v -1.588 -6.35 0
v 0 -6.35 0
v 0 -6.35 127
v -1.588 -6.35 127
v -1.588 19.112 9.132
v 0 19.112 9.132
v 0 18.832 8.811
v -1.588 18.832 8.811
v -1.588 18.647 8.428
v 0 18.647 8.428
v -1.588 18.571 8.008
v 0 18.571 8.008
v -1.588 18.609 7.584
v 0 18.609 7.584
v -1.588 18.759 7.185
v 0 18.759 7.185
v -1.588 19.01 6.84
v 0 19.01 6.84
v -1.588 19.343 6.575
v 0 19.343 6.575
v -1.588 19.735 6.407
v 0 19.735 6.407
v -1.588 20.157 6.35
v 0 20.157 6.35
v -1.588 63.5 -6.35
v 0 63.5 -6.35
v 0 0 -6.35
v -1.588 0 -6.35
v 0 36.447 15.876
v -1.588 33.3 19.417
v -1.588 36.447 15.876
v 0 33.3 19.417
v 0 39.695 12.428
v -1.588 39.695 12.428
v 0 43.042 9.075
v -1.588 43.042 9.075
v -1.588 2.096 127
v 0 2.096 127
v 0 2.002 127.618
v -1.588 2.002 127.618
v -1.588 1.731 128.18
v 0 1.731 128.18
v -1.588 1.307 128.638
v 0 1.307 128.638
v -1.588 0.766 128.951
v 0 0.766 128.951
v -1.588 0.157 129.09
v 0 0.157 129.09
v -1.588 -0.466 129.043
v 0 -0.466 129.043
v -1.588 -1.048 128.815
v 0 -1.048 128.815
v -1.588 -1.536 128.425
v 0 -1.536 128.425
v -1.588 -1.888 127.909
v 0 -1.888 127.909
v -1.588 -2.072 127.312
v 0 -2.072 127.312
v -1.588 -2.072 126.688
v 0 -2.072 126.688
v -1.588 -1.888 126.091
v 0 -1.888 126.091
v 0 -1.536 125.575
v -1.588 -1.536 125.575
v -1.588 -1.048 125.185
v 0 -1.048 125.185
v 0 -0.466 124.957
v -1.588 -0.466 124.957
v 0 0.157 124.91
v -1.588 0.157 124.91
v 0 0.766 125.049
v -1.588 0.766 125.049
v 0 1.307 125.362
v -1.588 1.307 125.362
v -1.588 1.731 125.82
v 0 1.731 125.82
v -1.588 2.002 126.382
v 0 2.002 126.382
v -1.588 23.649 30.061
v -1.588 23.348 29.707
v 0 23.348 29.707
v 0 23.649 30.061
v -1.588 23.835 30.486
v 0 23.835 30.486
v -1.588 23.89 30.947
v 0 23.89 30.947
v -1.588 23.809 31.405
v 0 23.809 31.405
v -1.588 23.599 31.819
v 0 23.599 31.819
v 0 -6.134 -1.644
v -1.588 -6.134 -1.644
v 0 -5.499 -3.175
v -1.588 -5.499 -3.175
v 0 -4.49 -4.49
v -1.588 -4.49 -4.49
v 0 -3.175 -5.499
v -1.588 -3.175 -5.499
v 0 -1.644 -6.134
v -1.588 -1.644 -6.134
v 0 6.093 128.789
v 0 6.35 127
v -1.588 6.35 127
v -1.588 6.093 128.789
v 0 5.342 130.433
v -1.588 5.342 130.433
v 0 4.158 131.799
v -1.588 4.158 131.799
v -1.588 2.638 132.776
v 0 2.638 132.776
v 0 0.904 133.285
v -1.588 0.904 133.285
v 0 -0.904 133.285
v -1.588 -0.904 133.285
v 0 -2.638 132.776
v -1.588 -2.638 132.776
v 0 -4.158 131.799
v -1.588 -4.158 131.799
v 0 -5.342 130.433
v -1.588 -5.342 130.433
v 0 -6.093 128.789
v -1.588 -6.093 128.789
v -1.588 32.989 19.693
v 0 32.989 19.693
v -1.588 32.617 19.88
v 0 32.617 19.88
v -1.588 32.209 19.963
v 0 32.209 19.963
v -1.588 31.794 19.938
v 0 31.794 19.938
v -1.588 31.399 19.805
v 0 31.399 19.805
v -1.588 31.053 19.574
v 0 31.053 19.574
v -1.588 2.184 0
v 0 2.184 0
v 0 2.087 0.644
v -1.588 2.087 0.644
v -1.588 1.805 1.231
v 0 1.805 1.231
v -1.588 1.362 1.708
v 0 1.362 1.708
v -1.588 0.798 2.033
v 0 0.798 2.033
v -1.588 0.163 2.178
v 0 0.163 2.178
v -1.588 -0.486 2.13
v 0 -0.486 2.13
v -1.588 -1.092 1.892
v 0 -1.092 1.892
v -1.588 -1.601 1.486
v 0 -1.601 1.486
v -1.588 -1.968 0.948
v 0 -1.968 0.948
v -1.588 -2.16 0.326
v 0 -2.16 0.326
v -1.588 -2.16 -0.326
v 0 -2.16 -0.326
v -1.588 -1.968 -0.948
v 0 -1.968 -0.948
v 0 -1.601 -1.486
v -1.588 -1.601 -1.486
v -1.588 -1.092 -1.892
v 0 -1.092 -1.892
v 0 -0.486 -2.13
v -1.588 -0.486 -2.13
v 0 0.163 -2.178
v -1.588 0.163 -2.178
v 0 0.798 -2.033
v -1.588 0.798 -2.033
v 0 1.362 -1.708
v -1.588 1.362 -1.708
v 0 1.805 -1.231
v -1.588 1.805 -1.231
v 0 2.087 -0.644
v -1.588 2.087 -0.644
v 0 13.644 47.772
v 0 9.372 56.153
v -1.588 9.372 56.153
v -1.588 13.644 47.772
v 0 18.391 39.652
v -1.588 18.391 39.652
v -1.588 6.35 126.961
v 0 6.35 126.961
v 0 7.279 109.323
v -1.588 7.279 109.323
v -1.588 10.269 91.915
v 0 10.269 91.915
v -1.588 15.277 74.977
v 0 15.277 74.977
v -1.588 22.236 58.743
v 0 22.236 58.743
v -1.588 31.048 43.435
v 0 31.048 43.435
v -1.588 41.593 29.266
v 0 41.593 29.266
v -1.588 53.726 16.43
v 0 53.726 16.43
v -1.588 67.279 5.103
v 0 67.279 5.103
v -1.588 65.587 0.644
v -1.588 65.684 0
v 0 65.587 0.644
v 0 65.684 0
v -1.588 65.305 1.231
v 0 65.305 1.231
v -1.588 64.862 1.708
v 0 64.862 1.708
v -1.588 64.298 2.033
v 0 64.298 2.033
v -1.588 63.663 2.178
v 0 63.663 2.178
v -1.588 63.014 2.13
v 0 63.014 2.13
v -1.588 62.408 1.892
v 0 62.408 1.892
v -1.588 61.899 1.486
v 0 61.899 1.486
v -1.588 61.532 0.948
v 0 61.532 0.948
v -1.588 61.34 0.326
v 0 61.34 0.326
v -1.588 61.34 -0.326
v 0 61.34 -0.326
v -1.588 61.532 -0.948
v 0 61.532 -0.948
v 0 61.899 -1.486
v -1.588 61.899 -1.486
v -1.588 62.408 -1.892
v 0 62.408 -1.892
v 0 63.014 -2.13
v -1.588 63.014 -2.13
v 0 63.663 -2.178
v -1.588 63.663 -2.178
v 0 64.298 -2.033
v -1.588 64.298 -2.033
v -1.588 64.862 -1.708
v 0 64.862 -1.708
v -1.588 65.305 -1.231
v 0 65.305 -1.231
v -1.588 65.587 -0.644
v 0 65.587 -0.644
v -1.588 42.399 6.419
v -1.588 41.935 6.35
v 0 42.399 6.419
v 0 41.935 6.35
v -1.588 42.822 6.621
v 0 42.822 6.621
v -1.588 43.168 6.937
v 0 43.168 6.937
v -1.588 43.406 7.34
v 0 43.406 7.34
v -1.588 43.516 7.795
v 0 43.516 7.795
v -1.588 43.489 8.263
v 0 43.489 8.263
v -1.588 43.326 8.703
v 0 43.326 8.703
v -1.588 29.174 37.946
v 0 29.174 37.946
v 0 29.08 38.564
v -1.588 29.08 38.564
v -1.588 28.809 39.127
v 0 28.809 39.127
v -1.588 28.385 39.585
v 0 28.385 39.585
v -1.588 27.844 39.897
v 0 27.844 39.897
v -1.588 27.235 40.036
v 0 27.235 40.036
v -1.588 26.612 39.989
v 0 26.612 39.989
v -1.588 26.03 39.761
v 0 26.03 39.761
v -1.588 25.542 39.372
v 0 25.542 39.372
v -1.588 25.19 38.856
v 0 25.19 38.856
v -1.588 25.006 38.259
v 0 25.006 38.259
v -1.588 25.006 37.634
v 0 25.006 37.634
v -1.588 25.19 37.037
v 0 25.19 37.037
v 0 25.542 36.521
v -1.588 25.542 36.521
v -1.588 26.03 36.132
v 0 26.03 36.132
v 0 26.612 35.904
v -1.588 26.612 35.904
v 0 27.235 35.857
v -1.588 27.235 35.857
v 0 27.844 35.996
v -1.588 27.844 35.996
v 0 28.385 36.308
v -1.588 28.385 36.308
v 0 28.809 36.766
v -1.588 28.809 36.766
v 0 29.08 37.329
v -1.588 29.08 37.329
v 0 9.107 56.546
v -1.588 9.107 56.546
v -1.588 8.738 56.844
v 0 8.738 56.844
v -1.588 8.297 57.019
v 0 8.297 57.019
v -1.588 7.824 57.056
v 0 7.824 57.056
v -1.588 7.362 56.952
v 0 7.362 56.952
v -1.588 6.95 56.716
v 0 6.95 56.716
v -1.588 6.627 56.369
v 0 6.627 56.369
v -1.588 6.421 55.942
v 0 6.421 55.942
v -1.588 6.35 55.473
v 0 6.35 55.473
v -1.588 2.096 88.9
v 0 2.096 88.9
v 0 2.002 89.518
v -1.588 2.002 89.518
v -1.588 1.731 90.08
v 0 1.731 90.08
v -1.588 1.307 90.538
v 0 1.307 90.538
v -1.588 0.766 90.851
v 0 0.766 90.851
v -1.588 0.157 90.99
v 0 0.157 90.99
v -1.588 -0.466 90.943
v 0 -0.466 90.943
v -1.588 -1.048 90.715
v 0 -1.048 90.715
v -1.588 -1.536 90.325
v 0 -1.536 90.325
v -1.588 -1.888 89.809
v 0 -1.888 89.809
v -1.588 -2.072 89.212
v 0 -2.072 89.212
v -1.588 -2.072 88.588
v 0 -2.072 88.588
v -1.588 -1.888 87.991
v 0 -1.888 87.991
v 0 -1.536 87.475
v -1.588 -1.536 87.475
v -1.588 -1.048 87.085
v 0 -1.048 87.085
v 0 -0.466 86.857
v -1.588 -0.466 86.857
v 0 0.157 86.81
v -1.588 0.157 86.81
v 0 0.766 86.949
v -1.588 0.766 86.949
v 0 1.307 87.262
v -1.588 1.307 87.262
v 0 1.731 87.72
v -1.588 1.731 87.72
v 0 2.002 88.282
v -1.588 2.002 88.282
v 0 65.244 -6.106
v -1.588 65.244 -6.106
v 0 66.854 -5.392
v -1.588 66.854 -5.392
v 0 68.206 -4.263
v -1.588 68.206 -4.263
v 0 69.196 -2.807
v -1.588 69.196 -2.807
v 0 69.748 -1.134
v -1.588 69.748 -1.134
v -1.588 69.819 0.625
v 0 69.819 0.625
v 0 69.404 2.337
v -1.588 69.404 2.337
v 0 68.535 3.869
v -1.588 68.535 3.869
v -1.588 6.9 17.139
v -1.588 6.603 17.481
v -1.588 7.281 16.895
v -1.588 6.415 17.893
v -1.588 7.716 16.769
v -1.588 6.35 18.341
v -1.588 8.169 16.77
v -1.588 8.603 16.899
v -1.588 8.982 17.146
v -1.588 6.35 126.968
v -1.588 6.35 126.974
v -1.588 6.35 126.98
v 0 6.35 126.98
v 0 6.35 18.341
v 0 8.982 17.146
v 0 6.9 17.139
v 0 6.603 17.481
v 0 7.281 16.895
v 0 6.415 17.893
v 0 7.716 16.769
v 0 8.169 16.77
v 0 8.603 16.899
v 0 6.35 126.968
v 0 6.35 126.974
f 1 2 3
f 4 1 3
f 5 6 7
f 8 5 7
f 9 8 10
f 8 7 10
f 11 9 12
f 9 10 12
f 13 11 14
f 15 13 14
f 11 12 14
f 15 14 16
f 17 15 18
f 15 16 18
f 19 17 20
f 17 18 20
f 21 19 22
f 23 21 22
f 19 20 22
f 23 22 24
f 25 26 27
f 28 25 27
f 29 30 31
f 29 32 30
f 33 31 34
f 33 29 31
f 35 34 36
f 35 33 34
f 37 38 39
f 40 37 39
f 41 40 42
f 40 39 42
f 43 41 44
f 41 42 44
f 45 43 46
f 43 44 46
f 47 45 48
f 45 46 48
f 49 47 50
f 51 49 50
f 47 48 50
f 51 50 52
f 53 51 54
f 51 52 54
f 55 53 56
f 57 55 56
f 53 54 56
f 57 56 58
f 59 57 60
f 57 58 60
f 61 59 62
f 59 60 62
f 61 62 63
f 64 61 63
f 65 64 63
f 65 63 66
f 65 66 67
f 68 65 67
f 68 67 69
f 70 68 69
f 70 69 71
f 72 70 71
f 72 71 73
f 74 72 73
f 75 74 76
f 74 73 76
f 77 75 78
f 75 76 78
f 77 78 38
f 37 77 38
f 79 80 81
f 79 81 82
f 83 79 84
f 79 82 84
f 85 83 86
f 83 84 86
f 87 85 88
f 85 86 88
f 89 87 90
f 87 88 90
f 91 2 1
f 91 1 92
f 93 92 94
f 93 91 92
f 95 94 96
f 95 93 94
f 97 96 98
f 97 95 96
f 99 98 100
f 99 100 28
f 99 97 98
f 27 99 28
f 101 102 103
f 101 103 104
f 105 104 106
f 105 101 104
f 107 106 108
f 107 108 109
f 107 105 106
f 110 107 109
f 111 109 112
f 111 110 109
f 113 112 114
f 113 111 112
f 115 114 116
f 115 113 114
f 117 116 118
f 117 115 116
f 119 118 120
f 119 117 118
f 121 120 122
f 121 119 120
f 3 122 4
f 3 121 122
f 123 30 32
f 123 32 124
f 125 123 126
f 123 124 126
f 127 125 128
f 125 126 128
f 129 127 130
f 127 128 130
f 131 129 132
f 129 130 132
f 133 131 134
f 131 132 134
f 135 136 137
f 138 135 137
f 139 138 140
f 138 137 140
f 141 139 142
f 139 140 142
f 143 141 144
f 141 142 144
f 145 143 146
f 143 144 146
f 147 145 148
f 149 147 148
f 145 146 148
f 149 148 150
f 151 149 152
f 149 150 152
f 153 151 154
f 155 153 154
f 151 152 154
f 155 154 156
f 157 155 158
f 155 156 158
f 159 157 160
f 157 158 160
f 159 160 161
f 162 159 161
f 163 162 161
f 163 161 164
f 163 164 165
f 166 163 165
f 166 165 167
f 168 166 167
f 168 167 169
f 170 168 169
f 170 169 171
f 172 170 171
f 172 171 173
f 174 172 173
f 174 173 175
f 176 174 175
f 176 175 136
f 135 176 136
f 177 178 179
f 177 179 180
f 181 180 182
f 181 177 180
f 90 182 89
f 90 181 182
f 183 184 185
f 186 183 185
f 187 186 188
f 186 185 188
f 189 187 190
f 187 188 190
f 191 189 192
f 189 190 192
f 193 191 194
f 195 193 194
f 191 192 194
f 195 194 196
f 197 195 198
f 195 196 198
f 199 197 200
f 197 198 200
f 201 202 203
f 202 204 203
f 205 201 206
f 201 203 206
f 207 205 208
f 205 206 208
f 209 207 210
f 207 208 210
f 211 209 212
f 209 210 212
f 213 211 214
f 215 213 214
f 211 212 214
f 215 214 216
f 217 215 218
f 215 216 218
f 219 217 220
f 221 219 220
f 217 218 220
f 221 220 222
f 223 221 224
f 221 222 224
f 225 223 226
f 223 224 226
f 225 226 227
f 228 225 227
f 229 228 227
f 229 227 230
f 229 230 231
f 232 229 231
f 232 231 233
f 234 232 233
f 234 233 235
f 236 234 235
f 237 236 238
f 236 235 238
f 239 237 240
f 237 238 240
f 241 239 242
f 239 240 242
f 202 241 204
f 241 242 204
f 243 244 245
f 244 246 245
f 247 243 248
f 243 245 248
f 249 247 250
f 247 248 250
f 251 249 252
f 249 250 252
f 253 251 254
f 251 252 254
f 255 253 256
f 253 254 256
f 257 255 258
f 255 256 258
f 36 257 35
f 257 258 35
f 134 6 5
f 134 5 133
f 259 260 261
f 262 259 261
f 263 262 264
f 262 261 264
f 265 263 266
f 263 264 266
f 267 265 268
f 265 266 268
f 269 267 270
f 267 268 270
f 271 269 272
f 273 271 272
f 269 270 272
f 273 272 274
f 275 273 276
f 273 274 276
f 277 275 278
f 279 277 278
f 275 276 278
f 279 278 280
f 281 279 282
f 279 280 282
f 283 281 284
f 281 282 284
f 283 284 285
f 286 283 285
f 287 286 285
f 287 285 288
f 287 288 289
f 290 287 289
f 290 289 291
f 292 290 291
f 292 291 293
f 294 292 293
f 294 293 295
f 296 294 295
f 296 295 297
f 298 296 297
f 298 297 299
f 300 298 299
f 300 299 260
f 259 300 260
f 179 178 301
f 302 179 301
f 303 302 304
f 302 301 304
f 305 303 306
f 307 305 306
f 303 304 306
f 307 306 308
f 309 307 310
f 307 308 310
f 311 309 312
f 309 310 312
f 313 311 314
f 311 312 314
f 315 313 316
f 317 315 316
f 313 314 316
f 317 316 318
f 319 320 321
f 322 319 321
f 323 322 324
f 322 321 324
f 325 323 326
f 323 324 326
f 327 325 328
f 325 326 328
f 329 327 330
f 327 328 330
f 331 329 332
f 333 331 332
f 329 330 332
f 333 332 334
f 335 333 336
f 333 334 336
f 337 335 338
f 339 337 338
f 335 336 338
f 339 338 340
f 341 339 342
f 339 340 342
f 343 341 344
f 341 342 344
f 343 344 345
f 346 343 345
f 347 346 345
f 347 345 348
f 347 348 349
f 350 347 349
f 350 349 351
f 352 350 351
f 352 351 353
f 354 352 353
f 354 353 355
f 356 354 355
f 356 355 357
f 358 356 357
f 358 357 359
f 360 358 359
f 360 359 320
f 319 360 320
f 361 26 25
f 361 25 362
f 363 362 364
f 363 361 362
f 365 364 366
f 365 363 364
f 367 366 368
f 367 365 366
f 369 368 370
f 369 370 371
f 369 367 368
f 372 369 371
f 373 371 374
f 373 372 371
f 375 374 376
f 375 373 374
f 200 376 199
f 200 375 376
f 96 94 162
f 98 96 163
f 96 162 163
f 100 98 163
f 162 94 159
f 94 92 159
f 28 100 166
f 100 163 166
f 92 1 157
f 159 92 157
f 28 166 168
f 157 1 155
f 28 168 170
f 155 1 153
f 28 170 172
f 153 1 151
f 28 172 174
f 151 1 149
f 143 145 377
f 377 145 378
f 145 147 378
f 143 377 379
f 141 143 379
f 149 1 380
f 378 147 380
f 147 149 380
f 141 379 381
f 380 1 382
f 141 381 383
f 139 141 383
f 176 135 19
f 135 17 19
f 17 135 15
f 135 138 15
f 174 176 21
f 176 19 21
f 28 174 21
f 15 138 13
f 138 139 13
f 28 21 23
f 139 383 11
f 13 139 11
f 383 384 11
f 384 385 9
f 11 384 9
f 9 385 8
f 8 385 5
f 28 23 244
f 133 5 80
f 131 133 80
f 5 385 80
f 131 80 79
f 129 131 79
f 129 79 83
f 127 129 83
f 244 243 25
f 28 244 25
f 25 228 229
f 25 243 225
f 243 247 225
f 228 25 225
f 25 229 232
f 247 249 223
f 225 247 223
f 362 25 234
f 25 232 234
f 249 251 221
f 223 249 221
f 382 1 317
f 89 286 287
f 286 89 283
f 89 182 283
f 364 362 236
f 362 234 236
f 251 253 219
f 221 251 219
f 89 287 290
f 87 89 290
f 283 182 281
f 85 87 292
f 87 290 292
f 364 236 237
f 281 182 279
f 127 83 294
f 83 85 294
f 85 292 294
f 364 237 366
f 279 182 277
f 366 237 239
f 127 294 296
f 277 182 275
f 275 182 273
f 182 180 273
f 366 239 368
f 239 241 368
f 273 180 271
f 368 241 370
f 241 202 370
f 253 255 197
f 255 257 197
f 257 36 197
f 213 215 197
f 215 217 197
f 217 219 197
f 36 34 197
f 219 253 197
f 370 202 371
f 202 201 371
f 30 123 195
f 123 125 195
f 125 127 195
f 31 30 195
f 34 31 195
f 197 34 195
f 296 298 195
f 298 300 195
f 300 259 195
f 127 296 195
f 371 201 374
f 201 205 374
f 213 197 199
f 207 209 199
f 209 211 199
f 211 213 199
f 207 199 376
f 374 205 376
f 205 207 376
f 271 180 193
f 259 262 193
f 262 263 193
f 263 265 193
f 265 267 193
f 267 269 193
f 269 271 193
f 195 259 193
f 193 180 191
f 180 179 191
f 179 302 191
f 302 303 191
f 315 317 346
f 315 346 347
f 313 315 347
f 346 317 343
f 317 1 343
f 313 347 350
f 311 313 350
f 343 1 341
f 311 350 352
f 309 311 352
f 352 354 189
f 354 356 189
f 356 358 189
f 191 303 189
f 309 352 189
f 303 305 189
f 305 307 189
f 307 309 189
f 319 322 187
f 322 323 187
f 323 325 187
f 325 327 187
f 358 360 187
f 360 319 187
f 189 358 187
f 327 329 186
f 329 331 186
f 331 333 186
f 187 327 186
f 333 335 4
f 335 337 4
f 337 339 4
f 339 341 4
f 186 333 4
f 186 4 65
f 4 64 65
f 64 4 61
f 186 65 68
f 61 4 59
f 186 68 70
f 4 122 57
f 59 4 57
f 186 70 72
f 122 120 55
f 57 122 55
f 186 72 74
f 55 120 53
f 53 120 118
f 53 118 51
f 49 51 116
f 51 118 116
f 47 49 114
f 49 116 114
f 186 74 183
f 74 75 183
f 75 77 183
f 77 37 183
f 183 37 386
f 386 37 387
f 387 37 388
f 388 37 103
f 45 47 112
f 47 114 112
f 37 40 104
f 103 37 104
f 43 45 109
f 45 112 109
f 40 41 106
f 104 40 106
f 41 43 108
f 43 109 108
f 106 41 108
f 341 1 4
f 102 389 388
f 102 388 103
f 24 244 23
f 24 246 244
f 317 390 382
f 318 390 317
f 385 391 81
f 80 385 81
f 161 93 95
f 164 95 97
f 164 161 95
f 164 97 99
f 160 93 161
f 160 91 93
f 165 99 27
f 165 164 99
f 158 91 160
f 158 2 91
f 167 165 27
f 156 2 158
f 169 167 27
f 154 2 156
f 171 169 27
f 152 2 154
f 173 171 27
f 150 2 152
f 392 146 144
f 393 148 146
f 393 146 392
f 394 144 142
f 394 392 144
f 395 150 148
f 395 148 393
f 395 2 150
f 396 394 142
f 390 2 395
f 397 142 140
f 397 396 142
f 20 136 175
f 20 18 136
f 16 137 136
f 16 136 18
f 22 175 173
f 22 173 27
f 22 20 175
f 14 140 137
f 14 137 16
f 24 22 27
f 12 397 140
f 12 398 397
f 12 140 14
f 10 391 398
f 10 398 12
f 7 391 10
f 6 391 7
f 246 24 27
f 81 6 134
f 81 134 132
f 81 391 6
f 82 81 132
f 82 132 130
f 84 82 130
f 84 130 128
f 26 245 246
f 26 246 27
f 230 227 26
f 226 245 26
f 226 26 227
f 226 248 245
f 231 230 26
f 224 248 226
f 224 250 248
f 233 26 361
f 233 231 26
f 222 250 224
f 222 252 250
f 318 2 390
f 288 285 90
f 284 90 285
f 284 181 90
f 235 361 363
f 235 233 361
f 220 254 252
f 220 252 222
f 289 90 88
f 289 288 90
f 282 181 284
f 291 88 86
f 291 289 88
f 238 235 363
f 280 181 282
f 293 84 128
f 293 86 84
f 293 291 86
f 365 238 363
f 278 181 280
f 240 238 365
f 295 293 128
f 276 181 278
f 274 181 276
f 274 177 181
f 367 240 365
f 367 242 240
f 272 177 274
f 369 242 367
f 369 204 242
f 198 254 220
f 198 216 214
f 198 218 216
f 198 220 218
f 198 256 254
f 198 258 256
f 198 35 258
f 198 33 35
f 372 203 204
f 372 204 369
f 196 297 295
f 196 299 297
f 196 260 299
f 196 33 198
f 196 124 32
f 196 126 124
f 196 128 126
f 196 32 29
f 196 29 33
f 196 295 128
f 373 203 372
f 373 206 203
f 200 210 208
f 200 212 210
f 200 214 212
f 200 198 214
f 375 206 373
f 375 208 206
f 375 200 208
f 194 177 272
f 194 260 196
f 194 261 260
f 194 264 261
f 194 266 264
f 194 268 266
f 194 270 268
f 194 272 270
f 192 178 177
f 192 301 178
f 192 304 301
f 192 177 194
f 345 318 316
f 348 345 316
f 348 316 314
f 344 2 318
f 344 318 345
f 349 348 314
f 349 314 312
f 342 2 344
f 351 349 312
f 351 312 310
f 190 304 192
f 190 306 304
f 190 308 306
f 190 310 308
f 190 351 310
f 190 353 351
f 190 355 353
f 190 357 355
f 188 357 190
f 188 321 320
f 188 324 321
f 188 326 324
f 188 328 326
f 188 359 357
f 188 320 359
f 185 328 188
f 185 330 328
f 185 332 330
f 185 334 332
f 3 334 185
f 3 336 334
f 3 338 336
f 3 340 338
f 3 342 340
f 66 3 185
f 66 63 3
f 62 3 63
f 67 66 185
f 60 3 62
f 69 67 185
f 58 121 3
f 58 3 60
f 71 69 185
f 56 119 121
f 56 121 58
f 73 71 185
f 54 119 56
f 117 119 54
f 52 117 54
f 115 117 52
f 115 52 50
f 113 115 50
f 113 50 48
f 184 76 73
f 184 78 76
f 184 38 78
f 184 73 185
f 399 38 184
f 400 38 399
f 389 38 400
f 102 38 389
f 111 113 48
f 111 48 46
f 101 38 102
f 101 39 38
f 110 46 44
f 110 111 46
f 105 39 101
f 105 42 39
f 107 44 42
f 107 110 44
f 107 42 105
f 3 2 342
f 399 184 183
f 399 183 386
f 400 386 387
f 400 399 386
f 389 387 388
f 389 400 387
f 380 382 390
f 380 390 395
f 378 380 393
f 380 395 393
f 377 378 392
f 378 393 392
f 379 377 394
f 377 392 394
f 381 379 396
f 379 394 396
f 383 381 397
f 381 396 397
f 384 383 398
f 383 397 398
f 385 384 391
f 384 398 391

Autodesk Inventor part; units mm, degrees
ref_plane "YZ Plane" through (0, 0, 0) normal (1, 0, 0) x (0, 1, 0)
ref_plane "XZ Plane" through (0, 0, 0) normal (0, 1, 0) x (-1, 0, 0)
ref_plane "XY Plane" through (0, 0, 0) normal (0, 0, 1) x (1, 0, 0)
sketch "main" plane through (0, 0, 0) normal (0, 0, 1) x (1, 0, 0)
  circle A0 centre (-72.2021, -58.7899) radius 2.1844
  circle A1 centre (-8.7021, -58.7899) radius 2.1844
  circle A2 centre (-72.2021, 68.2101) radius 2.0955
  arc A3 (-65.8522, 68.1715) -> (-78.5521, 68.2101) centre (-72.2021, 68.2101) ccw
  arc A4 (-78.5521, -58.7899) -> (-72.2021, -65.1399) centre (-72.2021, -58.7899) ccw
  arc A5 (-8.7021, -65.1399) -> (-4.923, -53.6869) centre (-8.7021, -58.7899) ccw
  line L0 (-8.7021, -65.1399) -> (-72.2021, -65.1399)
  line L1 (-78.5521, -58.7899) -> (-78.5521, 68.2101)
  arc A6 (-65.8522, 68.1715) -> (-4.923, -53.6869) centre (84.6432, 67.2577) ccw
  circle A7 centre (-45.1241, -20.8434) radius 2.0955
  circle A8 centre (-72.2021, 30.1101) radius 2.0955
  line L2 (-30.2668, -52.4399) -> (-52.0453, -52.4399)
  line L3 (-65.8521, -40.4491) -> (-65.8521, -3.317)
  line L4 (-65.8521, 68.1906) -> (-65.8521, 68.2101)
  arc A9 (-30.2668, -52.4399) -> (-29.1598, -49.7146) centre (-30.2668, -50.8524) ccw
  arc A10 (-62.8301, -2.6371) -> (-65.8521, -3.317) centre (-64.2646, -3.317) ccw
  line L5 (-63.2196, -41.6442) -> (-48.8544, -29.0826)
  line L6 (-53.0903, -49.6574) -> (-41.1491, -39.2154)
  arc A11 (-62.8301, -2.6371) -> (-48.6032, -26.9709) centre (84.6432, 67.2577) ccw
  arc A12 (-38.9023, -39.3732) -> (-29.1598, -49.7146) centre (84.6432, 67.2577) ccw
  arc A13 (-48.8544, -29.0826) -> (-48.6032, -26.9709) centre (-49.8994, -27.8875) ccw
  arc A14 (-65.8521, -40.4491) -> (-63.2196, -41.6442) centre (-64.2646, -40.4491) ccw
  arc A15 (-53.0903, -49.6574) -> (-52.0453, -52.4399) centre (-52.0453, -50.8524) ccw
  arc A16 (-38.9023, -39.3732) -> (-41.1491, -39.2154) centre (-40.1041, -40.4105) ccw
  point P0 (-46.4652, -14.2849)
  point P1 (-26.2898, -52.4399)
  point P2 (-65.8521, 4.1323)
  point P3 (-47.7717, -28.1358)
  point P4 (-39.9404, -38.1585)
  point P5 (-65.3871, -51.9749)
  dimension "d0" = 4.191
  dimension "d1" = 12.7
  dimension "d3" = 4.191
  dimension "d4" = 4.191
  dimension "d8" = 1.5875
  dimension "d9" = 12.7
  dimension "d10" = 6.35
  dimension "d11" = 1.5875
sketch "Sketch1" plane through (0, 0, 0) normal (1, 0, 0) x (0, 1, 0)
  circle A0 centre (0, 0) radius 2.1844
  circle A1 centre (63.5, 0) radius 2.1844
  circle A2 centre (0, 127) radius 2.0955
  arc A3 (6.3499, 126.9614) -> (-6.35, 127) centre (0, 127) ccw
  arc A4 (-6.35, 0) -> (0, -6.35) centre (0, 0) ccw
  arc A5 (63.5, -6.35) -> (67.2791, 5.103) centre (63.5, 0) ccw
  line L0 (63.5, -6.35) -> (0, -6.35)
  line L1 (-6.35, 0) -> (-6.35, 127)
  arc A6 (6.3499, 126.9614) -> (67.2791, 5.103) centre (156.8453, 126.0476) ccw
  circle A7 centre (27.078, 37.9465) radius 2.0955
  circle A8 centre (0, 88.9) radius 2.0955
  line L2 (41.9353, 6.35) -> (20.1568, 6.35)
  line L3 (6.35, 18.3408) -> (6.35, 55.4729)
  line L4 (6.35, 126.9805) -> (6.35, 127)
  arc A9 (41.9353, 6.35) -> (43.0423, 9.0753) centre (41.9353, 7.9375) ccw
  arc A10 (9.372, 56.1528) -> (6.35, 55.4729) centre (7.9375, 55.4729) ccw
  line L5 (8.9825, 17.1457) -> (23.3477, 29.7074)
  line L6 (19.1118, 9.1325) -> (31.053, 19.5745)
  arc A11 (9.372, 56.1528) -> (23.5989, 31.819) centre (156.8453, 126.0476) ccw
  arc A12 (33.2998, 19.4167) -> (43.0423, 9.0753) centre (156.8453, 126.0476) ccw
  arc A13 (23.3477, 29.7074) -> (23.5989, 31.819) centre (22.3027, 30.9024) ccw
  arc A14 (6.35, 18.3408) -> (8.9825, 17.1457) centre (7.9375, 18.3408) ccw
  arc A15 (19.1118, 9.1325) -> (20.1568, 6.35) centre (20.1568, 7.9375) ccw
  arc A16 (33.2998, 19.4167) -> (31.053, 19.5745) centre (32.098, 18.3794) ccw
extrude "Extrusion1" add sketch "Sketch1" against normal blind 1.5875
properties part number "Scoop Gusset" material "Acetal Resin, White"
